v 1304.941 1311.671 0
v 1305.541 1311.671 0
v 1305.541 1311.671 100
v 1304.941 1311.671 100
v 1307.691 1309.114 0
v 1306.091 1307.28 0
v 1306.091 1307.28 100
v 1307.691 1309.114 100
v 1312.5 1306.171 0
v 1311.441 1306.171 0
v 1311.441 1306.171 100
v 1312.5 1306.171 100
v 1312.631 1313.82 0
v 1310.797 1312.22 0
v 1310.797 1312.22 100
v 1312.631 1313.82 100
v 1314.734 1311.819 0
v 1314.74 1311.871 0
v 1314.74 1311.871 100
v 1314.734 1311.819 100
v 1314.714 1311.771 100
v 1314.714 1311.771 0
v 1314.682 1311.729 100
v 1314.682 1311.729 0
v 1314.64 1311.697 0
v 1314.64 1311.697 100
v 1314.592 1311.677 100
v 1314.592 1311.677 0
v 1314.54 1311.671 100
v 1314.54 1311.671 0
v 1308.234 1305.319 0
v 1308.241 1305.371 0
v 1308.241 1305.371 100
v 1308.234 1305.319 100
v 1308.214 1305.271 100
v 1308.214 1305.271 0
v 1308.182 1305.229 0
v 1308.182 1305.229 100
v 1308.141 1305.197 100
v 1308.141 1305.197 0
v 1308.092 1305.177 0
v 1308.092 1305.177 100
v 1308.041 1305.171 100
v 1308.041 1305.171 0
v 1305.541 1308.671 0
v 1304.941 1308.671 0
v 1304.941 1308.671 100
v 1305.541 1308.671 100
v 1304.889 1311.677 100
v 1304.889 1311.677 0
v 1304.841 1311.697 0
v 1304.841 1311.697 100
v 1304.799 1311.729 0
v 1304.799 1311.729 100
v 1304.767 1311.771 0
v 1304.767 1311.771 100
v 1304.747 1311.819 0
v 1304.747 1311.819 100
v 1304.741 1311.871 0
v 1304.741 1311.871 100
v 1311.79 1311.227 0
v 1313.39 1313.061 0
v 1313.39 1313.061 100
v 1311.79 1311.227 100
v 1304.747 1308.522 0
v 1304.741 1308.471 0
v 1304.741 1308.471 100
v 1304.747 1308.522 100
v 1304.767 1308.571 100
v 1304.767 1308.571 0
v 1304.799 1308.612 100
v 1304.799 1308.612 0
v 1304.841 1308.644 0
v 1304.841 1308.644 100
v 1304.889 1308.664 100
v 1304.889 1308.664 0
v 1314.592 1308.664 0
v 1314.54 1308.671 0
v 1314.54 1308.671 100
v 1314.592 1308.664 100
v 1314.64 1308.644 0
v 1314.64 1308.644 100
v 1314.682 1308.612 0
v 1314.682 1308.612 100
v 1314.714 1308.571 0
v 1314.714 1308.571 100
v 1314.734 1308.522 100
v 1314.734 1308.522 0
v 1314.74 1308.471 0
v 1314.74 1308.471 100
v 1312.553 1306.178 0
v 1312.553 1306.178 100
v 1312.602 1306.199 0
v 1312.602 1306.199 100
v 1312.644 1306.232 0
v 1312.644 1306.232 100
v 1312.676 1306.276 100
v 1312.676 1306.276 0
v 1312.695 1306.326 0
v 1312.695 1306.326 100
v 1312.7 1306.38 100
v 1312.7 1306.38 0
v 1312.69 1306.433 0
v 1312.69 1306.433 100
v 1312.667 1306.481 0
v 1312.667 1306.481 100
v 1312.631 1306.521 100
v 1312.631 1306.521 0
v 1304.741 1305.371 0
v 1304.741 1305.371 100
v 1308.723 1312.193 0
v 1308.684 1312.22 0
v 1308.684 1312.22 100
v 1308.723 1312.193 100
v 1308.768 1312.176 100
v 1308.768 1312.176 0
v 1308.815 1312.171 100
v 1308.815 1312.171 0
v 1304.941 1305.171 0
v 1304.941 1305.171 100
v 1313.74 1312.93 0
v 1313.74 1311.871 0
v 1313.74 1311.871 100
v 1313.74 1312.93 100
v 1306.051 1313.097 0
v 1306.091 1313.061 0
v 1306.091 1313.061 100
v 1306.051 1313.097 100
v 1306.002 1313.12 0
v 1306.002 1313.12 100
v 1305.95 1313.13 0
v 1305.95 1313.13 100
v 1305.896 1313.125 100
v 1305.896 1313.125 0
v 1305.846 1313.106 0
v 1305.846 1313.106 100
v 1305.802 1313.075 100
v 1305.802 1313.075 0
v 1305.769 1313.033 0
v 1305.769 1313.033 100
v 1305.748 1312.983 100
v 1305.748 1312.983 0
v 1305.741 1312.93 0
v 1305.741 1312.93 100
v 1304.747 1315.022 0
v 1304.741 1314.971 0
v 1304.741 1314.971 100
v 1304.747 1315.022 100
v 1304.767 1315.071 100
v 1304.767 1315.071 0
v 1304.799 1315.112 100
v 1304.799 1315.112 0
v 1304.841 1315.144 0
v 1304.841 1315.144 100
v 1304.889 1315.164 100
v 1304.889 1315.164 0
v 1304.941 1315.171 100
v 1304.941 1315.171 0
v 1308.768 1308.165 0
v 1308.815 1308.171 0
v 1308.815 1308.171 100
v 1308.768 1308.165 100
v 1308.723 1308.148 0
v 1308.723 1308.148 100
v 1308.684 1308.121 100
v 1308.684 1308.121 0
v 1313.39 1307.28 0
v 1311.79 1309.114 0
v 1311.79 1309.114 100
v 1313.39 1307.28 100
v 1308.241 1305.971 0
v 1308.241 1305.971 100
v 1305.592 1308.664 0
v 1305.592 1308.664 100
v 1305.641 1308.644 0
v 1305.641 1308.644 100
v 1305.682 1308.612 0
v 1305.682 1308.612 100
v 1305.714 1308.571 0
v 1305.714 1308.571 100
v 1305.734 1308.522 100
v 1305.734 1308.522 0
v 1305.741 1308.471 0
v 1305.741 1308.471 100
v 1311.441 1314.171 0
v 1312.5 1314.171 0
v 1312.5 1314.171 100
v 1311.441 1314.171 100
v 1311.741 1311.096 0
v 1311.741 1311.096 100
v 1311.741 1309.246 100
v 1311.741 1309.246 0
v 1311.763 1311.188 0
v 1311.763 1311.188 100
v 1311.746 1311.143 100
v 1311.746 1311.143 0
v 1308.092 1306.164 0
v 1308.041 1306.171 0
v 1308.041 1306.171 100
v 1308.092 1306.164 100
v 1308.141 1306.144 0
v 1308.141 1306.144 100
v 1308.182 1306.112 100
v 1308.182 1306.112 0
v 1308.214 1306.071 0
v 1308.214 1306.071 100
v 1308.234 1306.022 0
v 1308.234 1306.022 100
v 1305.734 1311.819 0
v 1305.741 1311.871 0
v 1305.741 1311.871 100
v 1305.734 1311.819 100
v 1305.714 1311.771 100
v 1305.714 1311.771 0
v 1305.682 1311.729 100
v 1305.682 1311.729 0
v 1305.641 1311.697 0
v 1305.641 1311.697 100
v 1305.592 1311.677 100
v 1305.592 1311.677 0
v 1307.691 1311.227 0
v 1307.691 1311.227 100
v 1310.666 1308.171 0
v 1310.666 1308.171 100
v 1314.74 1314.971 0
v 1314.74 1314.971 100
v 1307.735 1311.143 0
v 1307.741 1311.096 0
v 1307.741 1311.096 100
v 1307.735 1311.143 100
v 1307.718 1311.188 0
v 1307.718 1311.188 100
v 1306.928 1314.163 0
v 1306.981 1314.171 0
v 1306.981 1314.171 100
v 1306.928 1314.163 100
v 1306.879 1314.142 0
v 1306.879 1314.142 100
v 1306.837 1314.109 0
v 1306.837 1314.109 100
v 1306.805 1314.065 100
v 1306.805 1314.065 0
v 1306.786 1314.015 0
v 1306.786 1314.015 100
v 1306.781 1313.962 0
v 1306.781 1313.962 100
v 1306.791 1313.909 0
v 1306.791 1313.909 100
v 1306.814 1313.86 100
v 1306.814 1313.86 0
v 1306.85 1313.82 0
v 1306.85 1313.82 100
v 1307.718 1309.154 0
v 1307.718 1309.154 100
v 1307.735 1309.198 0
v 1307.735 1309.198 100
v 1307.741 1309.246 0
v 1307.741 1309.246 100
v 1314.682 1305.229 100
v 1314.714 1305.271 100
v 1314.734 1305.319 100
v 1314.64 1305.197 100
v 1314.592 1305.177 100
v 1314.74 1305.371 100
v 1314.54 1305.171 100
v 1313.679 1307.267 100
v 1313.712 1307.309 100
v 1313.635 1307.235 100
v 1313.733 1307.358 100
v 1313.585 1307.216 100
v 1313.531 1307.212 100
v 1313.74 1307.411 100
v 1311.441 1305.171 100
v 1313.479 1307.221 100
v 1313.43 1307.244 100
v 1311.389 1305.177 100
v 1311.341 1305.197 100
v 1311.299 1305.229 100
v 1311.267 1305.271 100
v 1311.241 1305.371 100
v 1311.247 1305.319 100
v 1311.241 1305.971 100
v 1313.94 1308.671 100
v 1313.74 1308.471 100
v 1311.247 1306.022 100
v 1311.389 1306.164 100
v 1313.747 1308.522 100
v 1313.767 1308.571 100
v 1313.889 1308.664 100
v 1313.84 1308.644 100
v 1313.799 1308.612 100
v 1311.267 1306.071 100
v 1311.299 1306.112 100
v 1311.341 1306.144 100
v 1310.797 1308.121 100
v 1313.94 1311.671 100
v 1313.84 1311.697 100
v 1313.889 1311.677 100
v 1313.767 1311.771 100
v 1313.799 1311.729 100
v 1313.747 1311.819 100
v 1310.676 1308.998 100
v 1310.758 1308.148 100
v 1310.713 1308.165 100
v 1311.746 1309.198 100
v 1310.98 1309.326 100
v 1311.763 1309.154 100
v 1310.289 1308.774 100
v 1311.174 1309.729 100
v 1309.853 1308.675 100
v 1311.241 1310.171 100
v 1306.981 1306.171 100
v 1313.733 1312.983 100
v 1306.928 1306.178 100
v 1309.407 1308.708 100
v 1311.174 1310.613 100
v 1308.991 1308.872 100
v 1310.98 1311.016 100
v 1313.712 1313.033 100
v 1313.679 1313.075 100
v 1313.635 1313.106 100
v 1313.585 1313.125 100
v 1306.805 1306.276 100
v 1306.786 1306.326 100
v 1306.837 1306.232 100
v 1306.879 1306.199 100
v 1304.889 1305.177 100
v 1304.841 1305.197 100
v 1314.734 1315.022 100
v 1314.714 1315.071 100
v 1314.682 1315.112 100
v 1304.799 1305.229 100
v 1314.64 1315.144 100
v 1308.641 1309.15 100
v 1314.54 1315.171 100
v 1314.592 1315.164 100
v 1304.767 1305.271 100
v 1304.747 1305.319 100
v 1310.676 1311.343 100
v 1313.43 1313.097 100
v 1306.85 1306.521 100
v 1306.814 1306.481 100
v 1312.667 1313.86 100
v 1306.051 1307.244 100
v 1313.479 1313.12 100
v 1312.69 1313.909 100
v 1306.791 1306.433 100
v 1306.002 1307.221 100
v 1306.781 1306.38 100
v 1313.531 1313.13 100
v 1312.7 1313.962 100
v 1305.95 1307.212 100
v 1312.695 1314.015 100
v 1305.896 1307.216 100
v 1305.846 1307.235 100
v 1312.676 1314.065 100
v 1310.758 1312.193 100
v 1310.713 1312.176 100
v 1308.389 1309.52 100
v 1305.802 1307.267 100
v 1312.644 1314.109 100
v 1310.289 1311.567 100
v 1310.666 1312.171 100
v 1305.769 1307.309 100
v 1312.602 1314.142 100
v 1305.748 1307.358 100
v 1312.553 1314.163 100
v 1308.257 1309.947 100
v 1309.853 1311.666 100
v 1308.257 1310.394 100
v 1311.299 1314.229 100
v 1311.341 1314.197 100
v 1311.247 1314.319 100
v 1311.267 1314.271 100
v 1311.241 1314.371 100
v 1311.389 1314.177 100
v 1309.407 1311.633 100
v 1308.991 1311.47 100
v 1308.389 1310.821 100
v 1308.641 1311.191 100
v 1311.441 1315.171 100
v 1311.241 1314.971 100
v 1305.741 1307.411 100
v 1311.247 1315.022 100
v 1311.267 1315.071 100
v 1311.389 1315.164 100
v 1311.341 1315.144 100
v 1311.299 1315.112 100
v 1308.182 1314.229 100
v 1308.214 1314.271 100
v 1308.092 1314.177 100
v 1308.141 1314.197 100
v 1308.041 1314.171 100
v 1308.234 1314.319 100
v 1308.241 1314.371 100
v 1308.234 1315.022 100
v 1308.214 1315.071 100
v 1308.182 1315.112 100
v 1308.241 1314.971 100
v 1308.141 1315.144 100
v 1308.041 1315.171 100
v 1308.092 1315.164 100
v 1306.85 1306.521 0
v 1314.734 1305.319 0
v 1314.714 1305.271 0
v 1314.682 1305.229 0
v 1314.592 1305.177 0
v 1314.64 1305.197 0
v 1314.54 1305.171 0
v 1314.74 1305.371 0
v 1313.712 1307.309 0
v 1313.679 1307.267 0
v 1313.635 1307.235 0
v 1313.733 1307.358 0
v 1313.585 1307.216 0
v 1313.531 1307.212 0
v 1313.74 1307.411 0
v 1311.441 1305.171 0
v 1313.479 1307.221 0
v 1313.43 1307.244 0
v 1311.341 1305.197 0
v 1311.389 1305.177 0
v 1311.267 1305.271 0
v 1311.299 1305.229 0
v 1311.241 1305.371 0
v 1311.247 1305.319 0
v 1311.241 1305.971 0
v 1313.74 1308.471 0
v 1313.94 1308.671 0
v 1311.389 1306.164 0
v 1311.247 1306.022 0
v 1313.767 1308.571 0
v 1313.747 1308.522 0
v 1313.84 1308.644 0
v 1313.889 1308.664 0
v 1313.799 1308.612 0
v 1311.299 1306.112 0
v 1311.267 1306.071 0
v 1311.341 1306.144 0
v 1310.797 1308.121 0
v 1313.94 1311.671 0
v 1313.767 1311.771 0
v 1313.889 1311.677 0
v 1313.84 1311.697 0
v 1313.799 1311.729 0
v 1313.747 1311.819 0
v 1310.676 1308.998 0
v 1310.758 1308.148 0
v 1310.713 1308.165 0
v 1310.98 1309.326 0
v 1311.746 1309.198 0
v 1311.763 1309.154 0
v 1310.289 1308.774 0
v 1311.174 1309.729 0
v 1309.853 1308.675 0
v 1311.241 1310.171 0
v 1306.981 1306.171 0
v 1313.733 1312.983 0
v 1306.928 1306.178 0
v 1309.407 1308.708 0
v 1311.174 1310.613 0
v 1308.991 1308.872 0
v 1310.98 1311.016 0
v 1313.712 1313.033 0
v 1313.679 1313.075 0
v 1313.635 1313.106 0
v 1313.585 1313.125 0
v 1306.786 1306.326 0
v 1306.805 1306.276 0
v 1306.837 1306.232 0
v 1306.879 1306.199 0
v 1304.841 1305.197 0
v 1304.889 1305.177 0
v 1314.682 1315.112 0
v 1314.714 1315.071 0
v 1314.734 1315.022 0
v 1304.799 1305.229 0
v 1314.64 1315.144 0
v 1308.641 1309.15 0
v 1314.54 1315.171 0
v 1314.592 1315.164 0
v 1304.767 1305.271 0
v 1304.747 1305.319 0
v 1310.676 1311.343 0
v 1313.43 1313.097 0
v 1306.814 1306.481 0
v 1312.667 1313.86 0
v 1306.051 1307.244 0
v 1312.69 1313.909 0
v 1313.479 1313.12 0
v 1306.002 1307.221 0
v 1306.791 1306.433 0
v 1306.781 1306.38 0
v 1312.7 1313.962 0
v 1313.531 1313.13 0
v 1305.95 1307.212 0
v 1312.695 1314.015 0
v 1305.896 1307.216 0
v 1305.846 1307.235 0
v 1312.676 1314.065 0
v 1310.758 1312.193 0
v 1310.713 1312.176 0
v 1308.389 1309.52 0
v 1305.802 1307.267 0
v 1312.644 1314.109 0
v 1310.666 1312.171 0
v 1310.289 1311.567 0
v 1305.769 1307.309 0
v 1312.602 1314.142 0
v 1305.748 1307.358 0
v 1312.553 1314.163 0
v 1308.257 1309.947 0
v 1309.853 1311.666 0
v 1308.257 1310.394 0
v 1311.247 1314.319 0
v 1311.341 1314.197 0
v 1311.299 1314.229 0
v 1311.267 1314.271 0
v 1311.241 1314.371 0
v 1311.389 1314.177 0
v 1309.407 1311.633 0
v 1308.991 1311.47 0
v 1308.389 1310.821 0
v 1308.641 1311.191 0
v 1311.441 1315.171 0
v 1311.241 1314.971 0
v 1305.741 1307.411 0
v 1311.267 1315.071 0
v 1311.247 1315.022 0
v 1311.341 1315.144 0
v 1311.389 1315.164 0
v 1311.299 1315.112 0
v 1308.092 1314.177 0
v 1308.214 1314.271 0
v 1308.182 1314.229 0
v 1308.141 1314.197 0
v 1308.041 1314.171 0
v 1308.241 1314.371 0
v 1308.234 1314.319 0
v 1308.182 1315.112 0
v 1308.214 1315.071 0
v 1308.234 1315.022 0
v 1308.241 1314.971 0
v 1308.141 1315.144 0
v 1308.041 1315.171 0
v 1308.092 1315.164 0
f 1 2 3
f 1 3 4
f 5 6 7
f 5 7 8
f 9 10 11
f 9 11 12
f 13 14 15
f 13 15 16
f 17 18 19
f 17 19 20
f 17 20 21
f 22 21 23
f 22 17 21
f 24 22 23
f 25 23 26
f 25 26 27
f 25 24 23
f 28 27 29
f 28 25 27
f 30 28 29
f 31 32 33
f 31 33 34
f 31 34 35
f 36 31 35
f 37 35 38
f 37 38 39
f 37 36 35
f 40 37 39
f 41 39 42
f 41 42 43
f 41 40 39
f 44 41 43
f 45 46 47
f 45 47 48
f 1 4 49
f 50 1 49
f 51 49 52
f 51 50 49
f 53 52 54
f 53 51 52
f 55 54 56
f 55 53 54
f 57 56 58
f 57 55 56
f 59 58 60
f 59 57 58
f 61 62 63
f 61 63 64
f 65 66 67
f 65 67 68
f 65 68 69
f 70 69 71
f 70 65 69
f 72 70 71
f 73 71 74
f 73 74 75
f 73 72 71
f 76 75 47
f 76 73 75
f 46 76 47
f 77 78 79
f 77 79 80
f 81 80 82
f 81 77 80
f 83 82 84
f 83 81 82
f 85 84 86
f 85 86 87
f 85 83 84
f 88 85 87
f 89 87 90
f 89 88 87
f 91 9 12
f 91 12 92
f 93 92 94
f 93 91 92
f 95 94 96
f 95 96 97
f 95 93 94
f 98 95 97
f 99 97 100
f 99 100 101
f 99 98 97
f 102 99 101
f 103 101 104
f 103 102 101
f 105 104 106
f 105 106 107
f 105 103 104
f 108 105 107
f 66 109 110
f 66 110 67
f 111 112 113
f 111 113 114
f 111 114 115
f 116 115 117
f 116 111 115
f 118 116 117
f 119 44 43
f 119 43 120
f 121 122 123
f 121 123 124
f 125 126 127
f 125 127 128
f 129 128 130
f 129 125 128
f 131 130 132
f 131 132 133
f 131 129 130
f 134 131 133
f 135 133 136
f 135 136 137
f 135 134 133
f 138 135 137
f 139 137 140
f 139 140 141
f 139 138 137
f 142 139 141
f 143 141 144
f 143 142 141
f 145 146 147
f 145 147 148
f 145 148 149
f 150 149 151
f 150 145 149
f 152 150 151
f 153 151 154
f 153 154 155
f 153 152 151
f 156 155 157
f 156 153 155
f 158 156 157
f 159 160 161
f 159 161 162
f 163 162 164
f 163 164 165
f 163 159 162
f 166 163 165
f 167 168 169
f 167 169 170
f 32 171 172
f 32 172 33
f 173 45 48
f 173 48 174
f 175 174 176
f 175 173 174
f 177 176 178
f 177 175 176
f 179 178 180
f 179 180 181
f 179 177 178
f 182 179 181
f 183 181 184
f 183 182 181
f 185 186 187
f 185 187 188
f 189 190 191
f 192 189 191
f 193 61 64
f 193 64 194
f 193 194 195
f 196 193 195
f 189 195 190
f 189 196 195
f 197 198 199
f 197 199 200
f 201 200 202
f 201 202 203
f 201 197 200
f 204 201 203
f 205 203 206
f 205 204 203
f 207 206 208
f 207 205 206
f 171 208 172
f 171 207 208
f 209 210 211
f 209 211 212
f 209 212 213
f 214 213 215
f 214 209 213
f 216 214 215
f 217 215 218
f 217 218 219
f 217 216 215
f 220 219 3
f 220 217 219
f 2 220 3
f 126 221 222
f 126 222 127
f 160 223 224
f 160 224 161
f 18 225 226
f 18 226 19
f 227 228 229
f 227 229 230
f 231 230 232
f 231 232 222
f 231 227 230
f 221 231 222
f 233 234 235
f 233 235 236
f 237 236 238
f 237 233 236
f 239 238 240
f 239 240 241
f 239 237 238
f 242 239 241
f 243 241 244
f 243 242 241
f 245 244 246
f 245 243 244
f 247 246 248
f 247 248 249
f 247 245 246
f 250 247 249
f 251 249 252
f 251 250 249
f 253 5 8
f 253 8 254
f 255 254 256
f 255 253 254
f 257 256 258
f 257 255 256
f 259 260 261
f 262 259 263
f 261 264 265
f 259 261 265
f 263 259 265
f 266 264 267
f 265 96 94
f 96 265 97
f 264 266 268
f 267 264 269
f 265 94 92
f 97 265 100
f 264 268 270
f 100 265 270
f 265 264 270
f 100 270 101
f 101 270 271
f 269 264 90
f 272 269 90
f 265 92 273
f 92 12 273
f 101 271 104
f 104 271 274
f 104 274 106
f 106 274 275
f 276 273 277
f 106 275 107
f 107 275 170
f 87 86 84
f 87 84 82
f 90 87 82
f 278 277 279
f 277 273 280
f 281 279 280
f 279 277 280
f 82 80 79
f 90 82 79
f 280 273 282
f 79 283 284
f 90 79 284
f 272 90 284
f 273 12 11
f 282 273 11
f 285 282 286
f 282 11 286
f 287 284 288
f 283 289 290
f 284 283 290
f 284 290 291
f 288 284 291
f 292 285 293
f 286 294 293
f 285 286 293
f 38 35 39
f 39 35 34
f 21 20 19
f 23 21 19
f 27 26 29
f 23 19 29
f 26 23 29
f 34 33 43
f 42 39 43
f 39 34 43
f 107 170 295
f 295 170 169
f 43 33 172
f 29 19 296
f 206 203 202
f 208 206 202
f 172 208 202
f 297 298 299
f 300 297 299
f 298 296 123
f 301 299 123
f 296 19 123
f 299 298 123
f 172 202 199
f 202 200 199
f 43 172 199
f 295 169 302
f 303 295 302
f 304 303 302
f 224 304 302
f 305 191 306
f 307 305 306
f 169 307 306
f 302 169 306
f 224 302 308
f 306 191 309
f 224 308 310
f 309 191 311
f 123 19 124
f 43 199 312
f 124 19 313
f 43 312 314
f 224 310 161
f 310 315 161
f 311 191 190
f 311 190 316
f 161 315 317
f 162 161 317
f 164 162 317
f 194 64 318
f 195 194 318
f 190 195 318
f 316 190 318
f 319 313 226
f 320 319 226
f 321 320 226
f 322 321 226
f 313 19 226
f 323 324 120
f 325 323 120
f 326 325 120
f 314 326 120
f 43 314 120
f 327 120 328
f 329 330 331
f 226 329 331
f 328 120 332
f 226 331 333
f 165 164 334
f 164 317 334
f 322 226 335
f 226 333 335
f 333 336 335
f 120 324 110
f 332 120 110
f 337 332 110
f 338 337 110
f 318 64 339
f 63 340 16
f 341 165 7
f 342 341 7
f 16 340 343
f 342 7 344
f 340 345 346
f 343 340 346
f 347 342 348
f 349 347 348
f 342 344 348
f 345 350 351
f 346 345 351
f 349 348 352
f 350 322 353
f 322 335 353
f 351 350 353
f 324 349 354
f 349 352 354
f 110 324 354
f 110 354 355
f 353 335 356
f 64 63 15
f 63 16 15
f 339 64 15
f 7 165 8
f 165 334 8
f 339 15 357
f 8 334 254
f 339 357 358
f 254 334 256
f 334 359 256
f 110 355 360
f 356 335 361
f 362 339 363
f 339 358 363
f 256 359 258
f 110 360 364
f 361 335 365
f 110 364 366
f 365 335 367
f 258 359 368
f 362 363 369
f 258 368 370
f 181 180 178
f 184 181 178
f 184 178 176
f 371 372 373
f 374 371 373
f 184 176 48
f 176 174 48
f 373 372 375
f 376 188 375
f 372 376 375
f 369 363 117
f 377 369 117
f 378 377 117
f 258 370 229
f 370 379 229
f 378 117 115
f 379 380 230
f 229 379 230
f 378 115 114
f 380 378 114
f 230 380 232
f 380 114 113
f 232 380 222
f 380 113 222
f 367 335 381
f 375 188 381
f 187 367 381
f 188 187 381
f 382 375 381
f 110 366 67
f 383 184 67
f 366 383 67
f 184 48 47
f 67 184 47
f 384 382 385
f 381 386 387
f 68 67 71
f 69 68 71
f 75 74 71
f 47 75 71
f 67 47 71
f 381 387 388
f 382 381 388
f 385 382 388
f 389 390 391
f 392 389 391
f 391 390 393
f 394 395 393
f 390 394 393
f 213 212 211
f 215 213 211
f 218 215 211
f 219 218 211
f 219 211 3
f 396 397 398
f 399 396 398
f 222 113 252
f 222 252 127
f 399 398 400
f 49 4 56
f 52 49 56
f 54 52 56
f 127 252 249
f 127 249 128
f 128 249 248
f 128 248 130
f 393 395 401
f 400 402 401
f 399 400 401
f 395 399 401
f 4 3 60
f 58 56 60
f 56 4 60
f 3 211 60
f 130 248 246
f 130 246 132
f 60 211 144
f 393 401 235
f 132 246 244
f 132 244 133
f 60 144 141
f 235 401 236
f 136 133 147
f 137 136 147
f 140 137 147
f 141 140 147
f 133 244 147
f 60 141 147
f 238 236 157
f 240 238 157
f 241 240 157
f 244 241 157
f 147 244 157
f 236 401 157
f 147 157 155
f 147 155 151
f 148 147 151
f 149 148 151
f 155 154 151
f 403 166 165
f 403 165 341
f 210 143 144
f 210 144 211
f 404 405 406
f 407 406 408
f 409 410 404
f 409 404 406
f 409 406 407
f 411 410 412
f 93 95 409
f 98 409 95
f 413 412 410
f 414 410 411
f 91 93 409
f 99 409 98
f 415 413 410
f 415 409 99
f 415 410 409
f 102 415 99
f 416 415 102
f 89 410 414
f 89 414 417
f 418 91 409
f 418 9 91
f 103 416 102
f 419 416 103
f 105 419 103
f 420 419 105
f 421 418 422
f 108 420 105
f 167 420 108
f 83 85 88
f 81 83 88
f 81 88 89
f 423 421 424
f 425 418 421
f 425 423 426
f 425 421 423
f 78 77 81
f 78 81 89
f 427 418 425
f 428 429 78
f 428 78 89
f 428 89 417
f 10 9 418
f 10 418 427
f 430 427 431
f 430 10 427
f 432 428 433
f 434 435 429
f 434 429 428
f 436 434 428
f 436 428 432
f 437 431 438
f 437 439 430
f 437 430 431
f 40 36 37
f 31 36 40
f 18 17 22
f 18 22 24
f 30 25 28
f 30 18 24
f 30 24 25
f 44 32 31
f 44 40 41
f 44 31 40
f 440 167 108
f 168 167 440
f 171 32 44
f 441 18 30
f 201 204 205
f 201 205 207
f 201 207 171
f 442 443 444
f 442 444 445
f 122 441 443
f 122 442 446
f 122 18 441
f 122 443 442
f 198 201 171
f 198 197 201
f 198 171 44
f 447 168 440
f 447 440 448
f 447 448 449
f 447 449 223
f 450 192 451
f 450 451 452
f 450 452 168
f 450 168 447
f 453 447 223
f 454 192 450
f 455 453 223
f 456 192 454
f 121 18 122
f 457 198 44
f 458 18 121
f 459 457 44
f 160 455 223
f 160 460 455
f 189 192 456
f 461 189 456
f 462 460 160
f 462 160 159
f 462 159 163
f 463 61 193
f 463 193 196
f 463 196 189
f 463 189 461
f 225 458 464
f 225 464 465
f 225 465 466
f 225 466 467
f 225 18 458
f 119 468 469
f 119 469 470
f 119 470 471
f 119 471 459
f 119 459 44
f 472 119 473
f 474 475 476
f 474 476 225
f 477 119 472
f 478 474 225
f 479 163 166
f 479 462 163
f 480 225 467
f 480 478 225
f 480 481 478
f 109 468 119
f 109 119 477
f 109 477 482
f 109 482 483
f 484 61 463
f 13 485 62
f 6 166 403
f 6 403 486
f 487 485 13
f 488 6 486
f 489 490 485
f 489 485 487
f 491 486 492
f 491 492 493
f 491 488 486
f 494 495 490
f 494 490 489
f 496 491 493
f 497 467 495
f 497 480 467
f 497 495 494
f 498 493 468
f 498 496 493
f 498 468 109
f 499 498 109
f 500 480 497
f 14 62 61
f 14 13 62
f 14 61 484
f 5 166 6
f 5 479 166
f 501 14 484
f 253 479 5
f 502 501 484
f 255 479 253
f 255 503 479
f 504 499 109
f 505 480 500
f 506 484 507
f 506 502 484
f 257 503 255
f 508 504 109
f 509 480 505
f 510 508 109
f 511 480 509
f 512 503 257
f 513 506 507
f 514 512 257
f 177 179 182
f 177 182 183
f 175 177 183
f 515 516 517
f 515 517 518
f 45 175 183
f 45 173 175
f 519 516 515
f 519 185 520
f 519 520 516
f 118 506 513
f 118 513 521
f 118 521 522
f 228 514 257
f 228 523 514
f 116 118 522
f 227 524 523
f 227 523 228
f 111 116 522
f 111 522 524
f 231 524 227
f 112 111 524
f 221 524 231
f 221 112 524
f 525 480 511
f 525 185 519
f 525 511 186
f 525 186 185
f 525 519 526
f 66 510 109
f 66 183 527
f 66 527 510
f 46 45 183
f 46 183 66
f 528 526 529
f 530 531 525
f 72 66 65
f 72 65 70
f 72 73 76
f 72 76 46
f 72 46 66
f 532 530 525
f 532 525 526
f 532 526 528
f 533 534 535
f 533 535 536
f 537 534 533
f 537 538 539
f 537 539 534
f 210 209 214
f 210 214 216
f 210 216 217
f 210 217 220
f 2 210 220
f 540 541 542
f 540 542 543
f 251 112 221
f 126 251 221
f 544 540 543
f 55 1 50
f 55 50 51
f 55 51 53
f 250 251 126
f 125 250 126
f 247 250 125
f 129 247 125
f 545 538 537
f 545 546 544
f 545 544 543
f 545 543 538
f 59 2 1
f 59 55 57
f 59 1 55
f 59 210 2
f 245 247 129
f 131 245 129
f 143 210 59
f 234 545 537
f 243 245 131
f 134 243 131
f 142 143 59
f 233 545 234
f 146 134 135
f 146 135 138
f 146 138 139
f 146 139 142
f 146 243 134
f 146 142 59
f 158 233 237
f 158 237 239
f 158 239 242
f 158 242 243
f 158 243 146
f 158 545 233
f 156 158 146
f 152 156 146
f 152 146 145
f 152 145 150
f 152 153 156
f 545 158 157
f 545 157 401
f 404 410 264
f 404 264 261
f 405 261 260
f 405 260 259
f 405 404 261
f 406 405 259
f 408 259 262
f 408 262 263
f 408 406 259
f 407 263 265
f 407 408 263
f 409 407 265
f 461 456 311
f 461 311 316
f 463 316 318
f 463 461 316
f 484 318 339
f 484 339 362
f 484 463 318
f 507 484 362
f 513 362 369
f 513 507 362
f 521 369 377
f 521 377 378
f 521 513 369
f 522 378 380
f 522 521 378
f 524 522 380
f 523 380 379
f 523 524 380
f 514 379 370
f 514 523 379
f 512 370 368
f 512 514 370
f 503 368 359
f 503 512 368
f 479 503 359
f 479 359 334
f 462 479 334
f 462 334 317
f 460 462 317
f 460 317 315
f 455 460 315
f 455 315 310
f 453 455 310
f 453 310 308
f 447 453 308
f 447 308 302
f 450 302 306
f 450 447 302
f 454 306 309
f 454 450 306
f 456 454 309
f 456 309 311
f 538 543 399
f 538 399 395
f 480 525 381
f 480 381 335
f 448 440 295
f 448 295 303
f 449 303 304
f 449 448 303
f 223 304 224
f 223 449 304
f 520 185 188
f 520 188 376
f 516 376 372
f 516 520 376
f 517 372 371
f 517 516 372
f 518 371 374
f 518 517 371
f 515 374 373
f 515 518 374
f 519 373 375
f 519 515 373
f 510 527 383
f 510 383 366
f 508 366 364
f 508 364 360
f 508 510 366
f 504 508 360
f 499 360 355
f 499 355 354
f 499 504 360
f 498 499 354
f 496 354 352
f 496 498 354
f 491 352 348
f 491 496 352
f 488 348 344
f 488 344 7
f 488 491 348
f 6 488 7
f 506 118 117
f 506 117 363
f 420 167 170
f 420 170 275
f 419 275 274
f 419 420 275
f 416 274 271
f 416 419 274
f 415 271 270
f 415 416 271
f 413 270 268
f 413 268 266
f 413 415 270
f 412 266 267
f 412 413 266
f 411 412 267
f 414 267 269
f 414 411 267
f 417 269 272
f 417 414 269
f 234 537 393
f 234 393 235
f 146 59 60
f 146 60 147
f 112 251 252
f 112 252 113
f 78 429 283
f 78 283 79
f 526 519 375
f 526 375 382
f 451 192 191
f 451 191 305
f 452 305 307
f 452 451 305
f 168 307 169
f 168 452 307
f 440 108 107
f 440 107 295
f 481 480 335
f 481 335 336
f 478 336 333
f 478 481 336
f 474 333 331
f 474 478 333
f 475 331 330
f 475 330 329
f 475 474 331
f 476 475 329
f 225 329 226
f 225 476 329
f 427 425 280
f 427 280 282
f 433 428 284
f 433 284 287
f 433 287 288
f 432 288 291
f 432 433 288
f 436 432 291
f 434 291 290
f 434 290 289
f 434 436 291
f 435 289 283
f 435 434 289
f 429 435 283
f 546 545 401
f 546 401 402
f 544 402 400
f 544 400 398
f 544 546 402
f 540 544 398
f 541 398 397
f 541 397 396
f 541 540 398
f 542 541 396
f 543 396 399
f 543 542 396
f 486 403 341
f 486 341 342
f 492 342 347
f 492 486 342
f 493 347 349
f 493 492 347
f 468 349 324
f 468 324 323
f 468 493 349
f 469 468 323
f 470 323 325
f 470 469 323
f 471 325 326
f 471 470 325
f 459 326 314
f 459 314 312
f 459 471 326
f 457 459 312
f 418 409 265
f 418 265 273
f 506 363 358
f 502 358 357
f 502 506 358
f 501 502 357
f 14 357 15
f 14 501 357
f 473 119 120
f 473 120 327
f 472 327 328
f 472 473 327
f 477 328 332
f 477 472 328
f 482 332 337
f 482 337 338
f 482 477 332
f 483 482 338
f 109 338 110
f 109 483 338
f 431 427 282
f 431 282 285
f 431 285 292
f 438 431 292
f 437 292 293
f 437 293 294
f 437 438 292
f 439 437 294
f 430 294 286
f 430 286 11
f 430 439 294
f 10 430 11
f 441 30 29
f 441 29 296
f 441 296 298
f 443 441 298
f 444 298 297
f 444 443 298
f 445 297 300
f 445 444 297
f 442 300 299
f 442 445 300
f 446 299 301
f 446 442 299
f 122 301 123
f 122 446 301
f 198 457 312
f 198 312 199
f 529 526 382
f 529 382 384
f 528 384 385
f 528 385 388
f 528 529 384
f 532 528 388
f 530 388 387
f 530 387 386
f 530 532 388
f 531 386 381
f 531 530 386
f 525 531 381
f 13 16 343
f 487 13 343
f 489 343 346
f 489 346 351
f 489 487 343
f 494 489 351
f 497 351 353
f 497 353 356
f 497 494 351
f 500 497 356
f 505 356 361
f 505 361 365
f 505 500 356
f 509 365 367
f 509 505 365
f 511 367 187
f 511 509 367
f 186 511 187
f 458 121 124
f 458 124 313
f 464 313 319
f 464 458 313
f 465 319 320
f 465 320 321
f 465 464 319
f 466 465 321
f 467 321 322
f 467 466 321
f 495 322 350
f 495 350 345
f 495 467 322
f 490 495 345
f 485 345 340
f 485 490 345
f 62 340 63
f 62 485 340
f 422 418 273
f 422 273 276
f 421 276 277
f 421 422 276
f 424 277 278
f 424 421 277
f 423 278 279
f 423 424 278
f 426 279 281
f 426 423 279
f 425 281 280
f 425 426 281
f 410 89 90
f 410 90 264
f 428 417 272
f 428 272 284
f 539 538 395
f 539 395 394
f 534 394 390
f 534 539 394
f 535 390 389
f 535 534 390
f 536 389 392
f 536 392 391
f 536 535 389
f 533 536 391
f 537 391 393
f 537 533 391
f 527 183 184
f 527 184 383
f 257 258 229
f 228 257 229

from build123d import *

# Parameters (mm, degrees)
MODEL_R             = 1.5
BOSS_EXTRUDE1_DEPTH = 100


with BuildPart() as part:
    # Model → Boss-Extrude1 (new body)
    with BuildSketch(Plane.XY):
        with BuildLine():
            Line((1314.74049485, 1308.470665301), (1314.74049485, 1305.370671501))
            ThreePointArc((1314.74049485, 1305.370671501), (1314.681916323, 1305.229250427), (1314.54049525, 1305.170671901))
            Line((1314.54049525, 1305.170671901), (1311.44050145, 1305.170671901))
            ThreePointArc((1311.44050145, 1305.170671901), (1311.299080376, 1305.229250427), (1311.24050185, 1305.370671501))
            Line((1311.24050185, 1305.370671501), (1311.24050185, 1305.970670301))
            ThreePointArc((1311.24050185, 1305.970670301), (1311.299080376, 1306.112091374), (1311.44050145, 1306.170669901))
            Line((1311.44050145, 1306.170669901), (1312.499844139, 1306.170669901))
            ThreePointArc((1312.499844139, 1306.170669901), (1312.687118906, 1306.300469773), (1312.631310779, 1306.521388984))
            Line((1312.631310779, 1306.521388984), (1310.796999872, 1308.121385784))
            ThreePointArc((1310.796999872, 1308.121385784), (1310.735732961, 1308.157941067), (1310.665533233, 1308.170665901))
            Line((1310.665533233, 1308.170665901), (1308.815476467, 1308.170665901))
            ThreePointArc((1308.815476467, 1308.170665901), (1308.745276739, 1308.157941067), (1308.684009827, 1308.121385784))
            Line((1308.684009827, 1308.121385784), (1306.849698921, 1306.521388984))
            ThreePointArc((1306.849698921, 1306.521388984), (1306.793890794, 1306.300469773), (1306.98116556, 1306.170669901))
            Line((1306.98116556, 1306.170669901), (1308.04050825, 1306.170669901))
            ThreePointArc((1308.04050825, 1306.170669901), (1308.181929323, 1306.112091374), (1308.24050785, 1305.970670301))
            Line((1308.24050785, 1305.970670301), (1308.24050785, 1305.370671501))
            ThreePointArc((1308.24050785, 1305.370671501), (1308.181929323, 1305.229250427), (1308.04050825, 1305.170671901))
            Line((1308.04050825, 1305.170671901), (1304.94051445, 1305.170671901))
            ThreePointArc((1304.94051445, 1305.170671901), (1304.799093376, 1305.229250427), (1304.74051485, 1305.370671501))
            Line((1304.74051485, 1305.370671501), (1304.74051485, 1308.470665301))
            ThreePointArc((1304.74051485, 1308.470665301), (1304.799093376, 1308.612086374), (1304.94051445, 1308.670664901))
            Line((1304.94051445, 1308.670664901), (1305.54051325, 1308.670664901))
            ThreePointArc((1305.54051325, 1308.670664901), (1305.681934323, 1308.612086374), (1305.74051285, 1308.470665301))
            Line((1305.74051285, 1308.470665301), (1305.74051285, 1307.411322611))
            ThreePointArc((1305.74051285, 1307.411322611), (1305.870312722, 1307.224047845), (1306.091231933, 1307.279855972))
            Line((1306.091231933, 1307.279855972), (1307.691228733, 1309.114166878))
            ThreePointArc((1307.691228733, 1309.114166878), (1307.727784016, 1309.17543379), (1307.74050885, 1309.245633518))
            Line((1307.74050885, 1309.245633518), (1307.74050885, 1311.095690284))
            ThreePointArc((1307.74050885, 1311.095690284), (1307.727784016, 1311.165890012), (1307.691228733, 1311.227156923))
            Line((1307.691228733, 1311.227156923), (1306.091231933, 1313.06146783))
            ThreePointArc((1306.091231933, 1313.06146783), (1305.870312722, 1313.117275957), (1305.74051285, 1312.93000119))
            Line((1305.74051285, 1312.93000119), (1305.74051285, 1311.870658501))
            ThreePointArc((1305.74051285, 1311.870658501), (1305.681934323, 1311.729237427), (1305.54051325, 1311.670658901))
            Line((1305.54051325, 1311.670658901), (1304.94051445, 1311.670658901))
            ThreePointArc((1304.94051445, 1311.670658901), (1304.799093376, 1311.729237427), (1304.74051485, 1311.870658501))
            Line((1304.74051485, 1311.870658501), (1304.74051485, 1314.970652301))
            ThreePointArc((1304.74051485, 1314.970652301), (1304.799093376, 1315.112073374), (1304.94051445, 1315.170651901))
            Line((1304.94051445, 1315.170651901), (1308.04050825, 1315.170651901))
            ThreePointArc((1308.04050825, 1315.170651901), (1308.181929323, 1315.112073374), (1308.24050785, 1314.970652301))
            Line((1308.24050785, 1314.970652301), (1308.24050785, 1314.370653501))
            ThreePointArc((1308.24050785, 1314.370653501), (1308.181929323, 1314.229232427), (1308.04050825, 1314.170653901))
            Line((1308.04050825, 1314.170653901), (1306.98116556, 1314.170653901))
            ThreePointArc((1306.98116556, 1314.170653901), (1306.793890794, 1314.040854029), (1306.849698921, 1313.819934817))
            Line((1306.849698921, 1313.819934817), (1308.684009827, 1312.219938017))
            ThreePointArc((1308.684009827, 1312.219938017), (1308.745276739, 1312.183382734), (1308.815476467, 1312.170657901))
            Line((1308.815476467, 1312.170657901), (1310.665533233, 1312.170657901))
            ThreePointArc((1310.665533233, 1312.170657901), (1310.735732961, 1312.183382734), (1310.796999872, 1312.219938017))
            Line((1310.796999872, 1312.219938017), (1312.631310779, 1313.819934817))
            ThreePointArc((1312.631310779, 1313.819934817), (1312.687118906, 1314.040854029), (1312.499844139, 1314.170653901))
            Line((1312.499844139, 1314.170653901), (1311.44050145, 1314.170653901))
            ThreePointArc((1311.44050145, 1314.170653901), (1311.299080376, 1314.229232427), (1311.24050185, 1314.370653501))
            Line((1311.24050185, 1314.370653501), (1311.24050185, 1314.970652301))
            ThreePointArc((1311.24050185, 1314.970652301), (1311.299080376, 1315.112073374), (1311.44050145, 1315.170651901))
            Line((1311.44050145, 1315.170651901), (1314.54049525, 1315.170651901))
            ThreePointArc((1314.54049525, 1315.170651901), (1314.681916323, 1315.112073374), (1314.74049485, 1314.970652301))
            Line((1314.74049485, 1314.970652301), (1314.74049485, 1311.870658501))
            ThreePointArc((1314.74049485, 1311.870658501), (1314.681916323, 1311.729237427), (1314.54049525, 1311.670658901))
            Line((1314.54049525, 1311.670658901), (1313.94049645, 1311.670658901))
            ThreePointArc((1313.94049645, 1311.670658901), (1313.799075376, 1311.729237427), (1313.74049685, 1311.870658501))
            Line((1313.74049685, 1311.870658501), (1313.74049685, 1312.93000119))
            ThreePointArc((1313.74049685, 1312.93000119), (1313.610696978, 1313.117275957), (1313.389777766, 1313.06146783))
            Line((1313.389777766, 1313.06146783), (1311.789780966, 1311.227156923))
            ThreePointArc((1311.789780966, 1311.227156923), (1311.753225683, 1311.165890012), (1311.74050085, 1311.095690284))
            Line((1311.74050085, 1311.095690284), (1311.74050085, 1309.245633518))
            ThreePointArc((1311.74050085, 1309.245633518), (1311.753225683, 1309.17543379), (1311.789780966, 1309.114166878))
            Line((1311.789780966, 1309.114166878), (1313.389777766, 1307.279855972))
            ThreePointArc((1313.389777766, 1307.279855972), (1313.610696978, 1307.224047845), (1313.74049685, 1307.411322611))
            Line((1313.74049685, 1307.411322611), (1313.74049685, 1308.470665301))
            ThreePointArc((1313.74049685, 1308.470665301), (1313.799075376, 1308.612086374), (1313.94049645, 1308.670664901))
            Line((1313.94049645, 1308.670664901), (1314.54049525, 1308.670664901))
            ThreePointArc((1314.54049525, 1308.670664901), (1314.681916323, 1308.612086374), (1314.74049485, 1308.470665301))
        make_face()
        with Locations((1309.74050485, 1310.170661901)):
            Circle(MODEL_R, mode=Mode.SUBTRACT)
    extrude(amount=BOSS_EXTRUDE1_DEPTH)


solid = part.part
